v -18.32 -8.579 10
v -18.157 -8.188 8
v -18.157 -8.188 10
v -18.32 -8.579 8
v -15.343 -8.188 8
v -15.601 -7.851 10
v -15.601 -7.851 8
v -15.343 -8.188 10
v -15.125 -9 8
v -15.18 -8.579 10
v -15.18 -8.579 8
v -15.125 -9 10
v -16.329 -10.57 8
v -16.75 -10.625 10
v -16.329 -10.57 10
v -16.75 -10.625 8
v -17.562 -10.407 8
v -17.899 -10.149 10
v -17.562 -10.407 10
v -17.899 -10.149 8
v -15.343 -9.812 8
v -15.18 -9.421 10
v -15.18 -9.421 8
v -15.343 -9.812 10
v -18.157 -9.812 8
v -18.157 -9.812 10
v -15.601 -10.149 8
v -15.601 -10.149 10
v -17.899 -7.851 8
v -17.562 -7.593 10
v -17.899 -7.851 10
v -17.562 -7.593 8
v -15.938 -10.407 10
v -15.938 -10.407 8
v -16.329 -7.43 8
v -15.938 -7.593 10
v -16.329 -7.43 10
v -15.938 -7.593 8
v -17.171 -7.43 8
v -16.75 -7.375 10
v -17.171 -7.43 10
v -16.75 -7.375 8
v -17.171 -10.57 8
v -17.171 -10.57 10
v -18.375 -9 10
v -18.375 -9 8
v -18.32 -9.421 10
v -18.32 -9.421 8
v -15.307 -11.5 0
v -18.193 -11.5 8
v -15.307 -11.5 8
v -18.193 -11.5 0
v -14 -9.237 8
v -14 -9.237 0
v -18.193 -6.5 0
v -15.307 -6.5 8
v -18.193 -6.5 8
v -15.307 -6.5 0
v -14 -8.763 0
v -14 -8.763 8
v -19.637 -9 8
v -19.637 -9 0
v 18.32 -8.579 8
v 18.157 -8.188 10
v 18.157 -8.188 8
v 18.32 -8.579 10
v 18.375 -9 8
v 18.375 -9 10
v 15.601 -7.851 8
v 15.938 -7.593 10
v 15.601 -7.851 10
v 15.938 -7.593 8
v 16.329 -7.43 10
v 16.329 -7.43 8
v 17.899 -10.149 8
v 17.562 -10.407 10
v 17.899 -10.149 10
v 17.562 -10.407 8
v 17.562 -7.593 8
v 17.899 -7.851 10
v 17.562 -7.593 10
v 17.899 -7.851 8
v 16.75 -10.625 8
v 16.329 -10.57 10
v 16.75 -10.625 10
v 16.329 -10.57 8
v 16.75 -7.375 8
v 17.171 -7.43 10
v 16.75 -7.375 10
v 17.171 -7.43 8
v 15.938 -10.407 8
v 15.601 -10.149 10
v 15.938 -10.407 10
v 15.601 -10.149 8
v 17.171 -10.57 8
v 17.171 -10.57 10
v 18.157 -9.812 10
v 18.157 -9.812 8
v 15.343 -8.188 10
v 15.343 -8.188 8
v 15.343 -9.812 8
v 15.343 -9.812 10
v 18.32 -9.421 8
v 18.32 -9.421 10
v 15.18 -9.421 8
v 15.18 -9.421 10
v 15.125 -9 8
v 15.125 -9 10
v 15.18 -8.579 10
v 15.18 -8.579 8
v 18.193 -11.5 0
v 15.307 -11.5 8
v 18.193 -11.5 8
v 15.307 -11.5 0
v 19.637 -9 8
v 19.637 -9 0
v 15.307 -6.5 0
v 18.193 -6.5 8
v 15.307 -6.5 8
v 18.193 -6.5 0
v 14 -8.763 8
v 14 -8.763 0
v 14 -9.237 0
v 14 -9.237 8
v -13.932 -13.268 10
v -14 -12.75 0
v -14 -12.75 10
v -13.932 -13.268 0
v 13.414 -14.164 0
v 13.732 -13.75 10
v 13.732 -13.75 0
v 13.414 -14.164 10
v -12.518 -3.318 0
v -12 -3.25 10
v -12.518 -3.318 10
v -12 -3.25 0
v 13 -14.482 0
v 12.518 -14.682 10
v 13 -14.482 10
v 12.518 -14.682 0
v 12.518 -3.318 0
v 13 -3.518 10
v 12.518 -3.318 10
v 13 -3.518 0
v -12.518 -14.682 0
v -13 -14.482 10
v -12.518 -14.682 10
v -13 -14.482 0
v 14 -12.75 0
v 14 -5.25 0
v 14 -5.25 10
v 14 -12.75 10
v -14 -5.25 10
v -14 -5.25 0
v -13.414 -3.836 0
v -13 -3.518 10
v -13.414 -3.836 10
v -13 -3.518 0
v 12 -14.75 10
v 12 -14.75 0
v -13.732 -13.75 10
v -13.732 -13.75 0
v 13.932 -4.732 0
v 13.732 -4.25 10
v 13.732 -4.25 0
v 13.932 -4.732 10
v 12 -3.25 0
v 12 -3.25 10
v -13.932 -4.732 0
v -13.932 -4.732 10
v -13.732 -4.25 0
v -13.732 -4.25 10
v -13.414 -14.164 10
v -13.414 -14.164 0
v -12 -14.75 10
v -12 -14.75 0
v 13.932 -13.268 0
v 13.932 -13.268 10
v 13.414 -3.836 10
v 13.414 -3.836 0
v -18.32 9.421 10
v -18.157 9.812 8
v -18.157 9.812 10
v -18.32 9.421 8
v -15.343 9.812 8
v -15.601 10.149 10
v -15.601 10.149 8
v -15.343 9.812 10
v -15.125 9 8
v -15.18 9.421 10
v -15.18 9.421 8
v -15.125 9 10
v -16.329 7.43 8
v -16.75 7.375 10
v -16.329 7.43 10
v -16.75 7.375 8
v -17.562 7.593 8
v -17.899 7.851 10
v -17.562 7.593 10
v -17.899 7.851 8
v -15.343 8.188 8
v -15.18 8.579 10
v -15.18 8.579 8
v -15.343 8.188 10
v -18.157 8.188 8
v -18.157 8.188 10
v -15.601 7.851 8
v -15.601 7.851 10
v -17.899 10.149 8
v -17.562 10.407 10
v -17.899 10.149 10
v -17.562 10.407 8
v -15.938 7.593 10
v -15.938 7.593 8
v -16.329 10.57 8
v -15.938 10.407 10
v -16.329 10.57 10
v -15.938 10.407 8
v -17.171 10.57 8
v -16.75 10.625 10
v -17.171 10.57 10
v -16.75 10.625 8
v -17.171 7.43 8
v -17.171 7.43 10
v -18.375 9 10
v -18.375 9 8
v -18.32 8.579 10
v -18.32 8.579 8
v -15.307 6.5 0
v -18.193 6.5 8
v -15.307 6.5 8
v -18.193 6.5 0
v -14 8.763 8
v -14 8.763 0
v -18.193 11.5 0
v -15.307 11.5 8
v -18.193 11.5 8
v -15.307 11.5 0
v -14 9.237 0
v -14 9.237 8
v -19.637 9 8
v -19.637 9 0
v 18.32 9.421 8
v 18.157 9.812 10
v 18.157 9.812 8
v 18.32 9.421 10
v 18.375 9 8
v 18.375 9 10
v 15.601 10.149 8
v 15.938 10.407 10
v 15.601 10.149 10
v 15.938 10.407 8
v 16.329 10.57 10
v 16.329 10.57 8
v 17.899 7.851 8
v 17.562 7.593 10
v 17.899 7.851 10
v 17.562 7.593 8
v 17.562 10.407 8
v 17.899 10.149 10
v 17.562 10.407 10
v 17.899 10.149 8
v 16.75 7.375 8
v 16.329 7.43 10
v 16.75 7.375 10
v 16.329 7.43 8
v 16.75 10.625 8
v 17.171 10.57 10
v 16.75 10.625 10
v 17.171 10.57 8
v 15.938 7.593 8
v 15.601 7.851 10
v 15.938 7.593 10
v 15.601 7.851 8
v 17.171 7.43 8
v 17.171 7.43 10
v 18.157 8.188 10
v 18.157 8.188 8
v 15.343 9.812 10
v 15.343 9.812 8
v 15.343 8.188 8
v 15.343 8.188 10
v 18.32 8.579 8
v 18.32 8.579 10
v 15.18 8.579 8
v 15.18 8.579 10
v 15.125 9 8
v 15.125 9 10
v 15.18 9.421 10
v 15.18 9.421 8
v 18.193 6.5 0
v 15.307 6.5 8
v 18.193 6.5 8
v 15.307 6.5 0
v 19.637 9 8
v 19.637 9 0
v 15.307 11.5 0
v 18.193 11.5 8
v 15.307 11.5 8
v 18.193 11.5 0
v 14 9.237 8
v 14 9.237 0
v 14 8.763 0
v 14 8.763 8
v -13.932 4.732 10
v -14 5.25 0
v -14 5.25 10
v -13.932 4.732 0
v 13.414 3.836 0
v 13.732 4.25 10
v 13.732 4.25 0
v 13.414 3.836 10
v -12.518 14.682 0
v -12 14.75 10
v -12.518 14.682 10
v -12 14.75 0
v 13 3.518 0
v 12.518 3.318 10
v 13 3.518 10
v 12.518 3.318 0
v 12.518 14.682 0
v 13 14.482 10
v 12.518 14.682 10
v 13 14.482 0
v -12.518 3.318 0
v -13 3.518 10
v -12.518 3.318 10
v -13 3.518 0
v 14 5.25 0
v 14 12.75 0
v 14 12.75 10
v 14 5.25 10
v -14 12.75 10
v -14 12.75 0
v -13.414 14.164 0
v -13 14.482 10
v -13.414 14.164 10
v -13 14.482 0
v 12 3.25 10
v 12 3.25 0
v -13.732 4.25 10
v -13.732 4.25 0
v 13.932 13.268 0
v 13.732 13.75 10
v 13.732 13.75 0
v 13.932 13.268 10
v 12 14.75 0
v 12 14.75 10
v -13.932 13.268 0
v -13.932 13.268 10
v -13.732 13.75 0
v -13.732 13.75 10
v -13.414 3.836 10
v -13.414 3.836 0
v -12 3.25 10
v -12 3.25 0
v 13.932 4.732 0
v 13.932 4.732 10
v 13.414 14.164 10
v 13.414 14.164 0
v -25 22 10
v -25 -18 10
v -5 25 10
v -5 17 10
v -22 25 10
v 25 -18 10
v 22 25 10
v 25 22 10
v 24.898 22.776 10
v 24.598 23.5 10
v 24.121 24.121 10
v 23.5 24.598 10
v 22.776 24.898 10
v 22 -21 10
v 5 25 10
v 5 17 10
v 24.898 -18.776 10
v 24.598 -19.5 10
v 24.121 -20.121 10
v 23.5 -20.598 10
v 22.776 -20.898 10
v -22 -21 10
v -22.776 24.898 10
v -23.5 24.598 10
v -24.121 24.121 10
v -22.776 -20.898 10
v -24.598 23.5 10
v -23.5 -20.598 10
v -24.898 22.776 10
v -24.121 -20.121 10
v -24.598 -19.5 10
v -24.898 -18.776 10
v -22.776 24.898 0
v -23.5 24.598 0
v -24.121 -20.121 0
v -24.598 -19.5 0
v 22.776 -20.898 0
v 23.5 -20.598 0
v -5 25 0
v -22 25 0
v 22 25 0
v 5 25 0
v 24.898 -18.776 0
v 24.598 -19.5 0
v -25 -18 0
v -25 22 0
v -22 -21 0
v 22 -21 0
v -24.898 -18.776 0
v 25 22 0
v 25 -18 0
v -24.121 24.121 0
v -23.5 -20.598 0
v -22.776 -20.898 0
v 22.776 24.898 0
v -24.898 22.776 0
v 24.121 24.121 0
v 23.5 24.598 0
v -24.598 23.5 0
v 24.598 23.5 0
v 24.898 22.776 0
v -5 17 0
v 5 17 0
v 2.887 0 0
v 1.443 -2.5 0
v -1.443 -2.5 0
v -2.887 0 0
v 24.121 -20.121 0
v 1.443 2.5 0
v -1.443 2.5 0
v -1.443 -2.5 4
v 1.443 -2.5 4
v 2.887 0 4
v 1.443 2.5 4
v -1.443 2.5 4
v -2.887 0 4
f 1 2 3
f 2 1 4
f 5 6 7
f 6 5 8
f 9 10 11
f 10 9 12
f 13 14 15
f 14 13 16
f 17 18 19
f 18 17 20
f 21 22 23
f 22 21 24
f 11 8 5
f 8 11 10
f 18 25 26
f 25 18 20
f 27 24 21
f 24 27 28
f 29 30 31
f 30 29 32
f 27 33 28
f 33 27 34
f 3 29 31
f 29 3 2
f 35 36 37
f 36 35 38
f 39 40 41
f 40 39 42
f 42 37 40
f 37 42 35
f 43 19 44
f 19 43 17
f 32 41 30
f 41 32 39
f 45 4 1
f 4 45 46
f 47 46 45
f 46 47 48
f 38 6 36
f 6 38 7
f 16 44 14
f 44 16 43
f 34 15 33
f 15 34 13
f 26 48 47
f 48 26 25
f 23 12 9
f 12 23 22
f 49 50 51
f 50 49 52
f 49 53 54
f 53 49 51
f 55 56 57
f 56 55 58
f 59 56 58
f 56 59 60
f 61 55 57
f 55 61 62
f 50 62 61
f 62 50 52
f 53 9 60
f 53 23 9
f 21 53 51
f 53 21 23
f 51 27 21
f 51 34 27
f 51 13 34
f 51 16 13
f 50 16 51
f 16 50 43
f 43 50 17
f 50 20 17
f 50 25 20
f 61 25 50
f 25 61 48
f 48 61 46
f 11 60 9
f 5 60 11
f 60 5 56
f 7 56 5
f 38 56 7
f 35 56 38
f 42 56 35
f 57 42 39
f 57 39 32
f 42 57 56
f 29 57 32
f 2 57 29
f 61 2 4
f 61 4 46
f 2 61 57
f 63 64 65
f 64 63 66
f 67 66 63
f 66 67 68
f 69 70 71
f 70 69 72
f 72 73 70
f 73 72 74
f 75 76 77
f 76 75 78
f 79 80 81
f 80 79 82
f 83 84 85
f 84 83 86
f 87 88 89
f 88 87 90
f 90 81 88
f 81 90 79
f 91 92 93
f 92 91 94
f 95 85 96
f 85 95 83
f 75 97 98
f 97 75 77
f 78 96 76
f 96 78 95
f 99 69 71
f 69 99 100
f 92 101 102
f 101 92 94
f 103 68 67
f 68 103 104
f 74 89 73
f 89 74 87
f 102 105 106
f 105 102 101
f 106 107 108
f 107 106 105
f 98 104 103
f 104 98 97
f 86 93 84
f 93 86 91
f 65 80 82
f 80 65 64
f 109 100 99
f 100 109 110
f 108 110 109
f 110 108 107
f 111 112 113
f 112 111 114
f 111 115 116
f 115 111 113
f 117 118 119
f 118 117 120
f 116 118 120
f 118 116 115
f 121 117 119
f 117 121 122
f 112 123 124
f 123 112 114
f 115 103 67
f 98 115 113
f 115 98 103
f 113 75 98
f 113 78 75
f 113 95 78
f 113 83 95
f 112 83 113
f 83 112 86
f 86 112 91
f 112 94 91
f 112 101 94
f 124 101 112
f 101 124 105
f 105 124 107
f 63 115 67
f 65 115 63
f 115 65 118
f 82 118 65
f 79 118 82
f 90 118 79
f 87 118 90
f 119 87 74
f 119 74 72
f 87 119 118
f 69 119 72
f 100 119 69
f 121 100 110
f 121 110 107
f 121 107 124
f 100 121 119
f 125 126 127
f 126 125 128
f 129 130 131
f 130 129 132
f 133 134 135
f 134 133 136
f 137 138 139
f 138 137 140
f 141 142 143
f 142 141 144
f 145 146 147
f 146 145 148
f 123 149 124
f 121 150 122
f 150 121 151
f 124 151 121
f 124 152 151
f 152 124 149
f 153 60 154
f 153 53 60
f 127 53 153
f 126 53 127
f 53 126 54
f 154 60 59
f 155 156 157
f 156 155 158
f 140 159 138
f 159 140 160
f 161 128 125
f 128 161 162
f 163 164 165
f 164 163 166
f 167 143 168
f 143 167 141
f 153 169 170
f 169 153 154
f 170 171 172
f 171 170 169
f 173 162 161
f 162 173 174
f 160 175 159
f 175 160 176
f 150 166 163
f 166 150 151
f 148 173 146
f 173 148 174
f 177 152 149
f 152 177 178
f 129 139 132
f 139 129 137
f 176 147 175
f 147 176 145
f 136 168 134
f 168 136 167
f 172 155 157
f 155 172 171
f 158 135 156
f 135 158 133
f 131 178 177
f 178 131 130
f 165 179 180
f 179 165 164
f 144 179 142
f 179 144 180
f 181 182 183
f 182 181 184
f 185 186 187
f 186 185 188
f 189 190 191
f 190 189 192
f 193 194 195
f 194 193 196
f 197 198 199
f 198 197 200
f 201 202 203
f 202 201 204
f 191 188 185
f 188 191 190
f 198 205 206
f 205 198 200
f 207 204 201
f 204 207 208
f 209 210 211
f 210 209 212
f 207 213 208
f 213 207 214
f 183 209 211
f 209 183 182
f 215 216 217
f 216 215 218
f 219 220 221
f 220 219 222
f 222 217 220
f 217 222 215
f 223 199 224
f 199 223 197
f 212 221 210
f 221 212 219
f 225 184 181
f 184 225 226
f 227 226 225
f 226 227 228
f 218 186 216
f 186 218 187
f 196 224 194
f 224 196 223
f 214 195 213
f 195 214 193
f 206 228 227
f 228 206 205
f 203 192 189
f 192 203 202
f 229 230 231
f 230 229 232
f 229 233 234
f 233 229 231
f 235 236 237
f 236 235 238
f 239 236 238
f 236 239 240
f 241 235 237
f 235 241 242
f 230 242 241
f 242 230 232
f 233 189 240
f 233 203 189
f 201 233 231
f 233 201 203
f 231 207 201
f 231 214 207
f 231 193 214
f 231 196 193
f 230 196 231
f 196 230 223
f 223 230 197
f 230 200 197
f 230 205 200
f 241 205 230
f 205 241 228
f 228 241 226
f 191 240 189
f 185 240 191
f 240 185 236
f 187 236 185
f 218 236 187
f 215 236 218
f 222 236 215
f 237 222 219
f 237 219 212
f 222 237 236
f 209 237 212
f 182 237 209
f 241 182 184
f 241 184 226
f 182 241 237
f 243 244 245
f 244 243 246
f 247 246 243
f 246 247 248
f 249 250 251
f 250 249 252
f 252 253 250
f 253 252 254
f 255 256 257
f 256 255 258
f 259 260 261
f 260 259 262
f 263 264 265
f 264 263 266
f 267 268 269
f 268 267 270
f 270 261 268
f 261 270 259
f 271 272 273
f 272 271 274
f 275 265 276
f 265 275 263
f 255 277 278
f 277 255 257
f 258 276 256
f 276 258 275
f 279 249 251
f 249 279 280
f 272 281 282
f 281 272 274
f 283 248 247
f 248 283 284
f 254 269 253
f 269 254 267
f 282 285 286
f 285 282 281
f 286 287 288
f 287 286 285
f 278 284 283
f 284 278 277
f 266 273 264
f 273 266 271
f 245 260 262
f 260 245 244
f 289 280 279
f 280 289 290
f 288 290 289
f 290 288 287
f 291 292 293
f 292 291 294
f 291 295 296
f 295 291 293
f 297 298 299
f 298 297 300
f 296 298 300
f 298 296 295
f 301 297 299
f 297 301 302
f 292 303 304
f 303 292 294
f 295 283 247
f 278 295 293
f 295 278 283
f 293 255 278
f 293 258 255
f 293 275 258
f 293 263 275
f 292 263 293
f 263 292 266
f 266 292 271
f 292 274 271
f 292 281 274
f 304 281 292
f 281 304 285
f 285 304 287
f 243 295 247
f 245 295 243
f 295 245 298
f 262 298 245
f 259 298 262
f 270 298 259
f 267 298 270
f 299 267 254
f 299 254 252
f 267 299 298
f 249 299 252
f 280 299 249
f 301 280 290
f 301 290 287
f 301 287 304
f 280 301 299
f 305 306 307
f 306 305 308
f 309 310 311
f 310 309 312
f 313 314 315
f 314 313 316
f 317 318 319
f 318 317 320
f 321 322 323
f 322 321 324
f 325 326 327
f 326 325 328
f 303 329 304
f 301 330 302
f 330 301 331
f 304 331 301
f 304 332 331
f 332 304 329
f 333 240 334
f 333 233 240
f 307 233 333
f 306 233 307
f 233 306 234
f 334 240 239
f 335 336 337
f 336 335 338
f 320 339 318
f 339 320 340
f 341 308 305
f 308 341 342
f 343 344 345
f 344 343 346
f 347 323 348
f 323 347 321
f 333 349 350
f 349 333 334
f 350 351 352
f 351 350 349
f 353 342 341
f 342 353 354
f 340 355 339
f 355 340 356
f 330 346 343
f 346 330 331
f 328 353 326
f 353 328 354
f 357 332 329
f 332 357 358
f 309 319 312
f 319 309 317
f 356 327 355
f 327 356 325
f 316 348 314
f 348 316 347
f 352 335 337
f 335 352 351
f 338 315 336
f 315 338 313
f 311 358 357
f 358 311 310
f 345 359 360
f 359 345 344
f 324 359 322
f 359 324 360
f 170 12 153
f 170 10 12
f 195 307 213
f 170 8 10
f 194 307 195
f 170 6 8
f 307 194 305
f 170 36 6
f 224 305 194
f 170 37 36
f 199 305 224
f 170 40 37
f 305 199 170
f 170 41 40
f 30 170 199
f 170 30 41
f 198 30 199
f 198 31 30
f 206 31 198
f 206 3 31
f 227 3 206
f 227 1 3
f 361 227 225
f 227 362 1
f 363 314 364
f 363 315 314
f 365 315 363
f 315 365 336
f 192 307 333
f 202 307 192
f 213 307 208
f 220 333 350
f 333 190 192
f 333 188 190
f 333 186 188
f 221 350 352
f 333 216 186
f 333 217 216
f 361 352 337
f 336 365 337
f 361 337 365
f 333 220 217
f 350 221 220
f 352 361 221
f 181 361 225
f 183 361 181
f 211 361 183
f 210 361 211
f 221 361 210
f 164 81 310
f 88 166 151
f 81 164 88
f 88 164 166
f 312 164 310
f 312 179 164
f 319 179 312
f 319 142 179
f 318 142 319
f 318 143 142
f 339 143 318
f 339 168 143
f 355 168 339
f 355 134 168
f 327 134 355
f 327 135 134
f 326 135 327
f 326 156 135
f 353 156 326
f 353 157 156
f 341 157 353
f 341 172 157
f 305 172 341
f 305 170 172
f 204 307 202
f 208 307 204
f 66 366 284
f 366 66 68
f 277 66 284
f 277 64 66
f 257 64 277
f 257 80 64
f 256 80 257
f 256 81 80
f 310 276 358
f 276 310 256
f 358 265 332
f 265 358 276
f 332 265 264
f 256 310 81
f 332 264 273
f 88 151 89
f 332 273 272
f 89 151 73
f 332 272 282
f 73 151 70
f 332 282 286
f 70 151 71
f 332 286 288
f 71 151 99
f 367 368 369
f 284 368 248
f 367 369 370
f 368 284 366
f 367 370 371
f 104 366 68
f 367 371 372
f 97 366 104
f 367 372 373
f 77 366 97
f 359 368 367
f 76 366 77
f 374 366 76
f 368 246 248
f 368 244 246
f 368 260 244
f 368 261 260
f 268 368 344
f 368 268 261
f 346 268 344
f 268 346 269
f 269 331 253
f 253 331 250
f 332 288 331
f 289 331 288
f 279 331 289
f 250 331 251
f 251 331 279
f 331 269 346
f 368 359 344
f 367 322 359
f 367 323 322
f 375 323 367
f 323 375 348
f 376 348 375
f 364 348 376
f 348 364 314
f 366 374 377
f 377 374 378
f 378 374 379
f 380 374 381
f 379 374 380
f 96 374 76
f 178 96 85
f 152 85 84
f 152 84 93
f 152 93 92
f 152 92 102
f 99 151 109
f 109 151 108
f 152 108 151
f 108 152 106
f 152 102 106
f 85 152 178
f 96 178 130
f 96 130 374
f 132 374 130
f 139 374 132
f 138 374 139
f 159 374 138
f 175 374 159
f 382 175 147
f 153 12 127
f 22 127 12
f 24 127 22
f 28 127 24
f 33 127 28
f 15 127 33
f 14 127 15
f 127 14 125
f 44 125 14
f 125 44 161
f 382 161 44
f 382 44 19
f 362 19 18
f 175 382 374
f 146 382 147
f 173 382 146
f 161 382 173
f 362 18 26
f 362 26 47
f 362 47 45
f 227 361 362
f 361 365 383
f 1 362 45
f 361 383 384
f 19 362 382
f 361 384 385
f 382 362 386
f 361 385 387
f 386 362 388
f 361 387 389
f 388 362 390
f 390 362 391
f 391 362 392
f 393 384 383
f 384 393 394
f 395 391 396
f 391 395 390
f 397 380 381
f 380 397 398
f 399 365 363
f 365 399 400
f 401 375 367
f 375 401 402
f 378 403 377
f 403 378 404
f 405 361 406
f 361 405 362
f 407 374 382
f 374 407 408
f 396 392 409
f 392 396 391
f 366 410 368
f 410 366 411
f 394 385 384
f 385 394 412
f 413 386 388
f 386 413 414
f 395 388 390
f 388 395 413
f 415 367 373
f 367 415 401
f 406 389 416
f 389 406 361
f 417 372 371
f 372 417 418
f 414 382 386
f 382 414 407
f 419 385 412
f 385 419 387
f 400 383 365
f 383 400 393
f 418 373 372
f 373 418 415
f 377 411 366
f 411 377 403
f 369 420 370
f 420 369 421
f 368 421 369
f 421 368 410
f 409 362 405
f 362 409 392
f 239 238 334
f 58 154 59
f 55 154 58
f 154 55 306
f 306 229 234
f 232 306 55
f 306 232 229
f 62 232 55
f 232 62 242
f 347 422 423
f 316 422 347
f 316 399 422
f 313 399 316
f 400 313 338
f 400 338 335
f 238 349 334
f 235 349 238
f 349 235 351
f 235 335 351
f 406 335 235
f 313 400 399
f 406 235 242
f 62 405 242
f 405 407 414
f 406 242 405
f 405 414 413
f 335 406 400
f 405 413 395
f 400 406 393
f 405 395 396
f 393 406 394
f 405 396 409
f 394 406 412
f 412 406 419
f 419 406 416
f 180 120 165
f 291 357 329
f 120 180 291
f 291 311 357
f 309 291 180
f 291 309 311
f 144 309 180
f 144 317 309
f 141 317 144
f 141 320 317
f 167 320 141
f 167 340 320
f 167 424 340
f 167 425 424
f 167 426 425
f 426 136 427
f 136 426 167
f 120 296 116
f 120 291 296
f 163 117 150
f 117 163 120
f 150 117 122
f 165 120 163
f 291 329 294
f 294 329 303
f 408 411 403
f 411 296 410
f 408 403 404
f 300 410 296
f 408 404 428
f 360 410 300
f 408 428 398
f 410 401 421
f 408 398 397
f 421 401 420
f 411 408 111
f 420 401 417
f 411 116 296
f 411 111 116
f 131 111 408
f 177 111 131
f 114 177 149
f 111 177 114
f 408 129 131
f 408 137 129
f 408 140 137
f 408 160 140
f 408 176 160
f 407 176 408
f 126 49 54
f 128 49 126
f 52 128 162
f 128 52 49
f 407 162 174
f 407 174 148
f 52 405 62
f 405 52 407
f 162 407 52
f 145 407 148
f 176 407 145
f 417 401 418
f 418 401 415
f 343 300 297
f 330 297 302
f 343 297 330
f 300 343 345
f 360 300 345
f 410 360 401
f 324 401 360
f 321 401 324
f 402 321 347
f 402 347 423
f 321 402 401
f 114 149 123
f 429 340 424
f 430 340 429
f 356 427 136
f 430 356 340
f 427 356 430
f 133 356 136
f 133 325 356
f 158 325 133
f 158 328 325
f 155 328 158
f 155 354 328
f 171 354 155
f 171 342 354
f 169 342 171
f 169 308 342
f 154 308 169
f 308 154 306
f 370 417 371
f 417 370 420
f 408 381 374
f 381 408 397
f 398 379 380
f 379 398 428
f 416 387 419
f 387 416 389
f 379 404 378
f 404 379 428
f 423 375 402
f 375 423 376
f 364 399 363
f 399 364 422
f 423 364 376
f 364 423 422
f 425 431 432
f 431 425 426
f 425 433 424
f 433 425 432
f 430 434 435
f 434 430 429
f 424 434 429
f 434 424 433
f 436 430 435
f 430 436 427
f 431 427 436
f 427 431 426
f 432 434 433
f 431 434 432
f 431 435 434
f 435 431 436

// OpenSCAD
// file: ../OpenSCAD_Modules/cube_vround.scad
module cube_vround(
	size=[10,10,10],
	round_corners=[true,true,true,true],
	rounding=3,
	center_xy=false,
	center_z=false,
	attach=0,
	wall_attach=0,
	quality=2, //integer from 1 to infinity
)
{
	assert(len(size)==3);
	assert(len(round_corners)==4);
	assert(rounding>0);
	assert(rounding<=size[0]/2);
	assert(rounding<=size[1]/2);
	assert(quality>0);
	assert(attach>=0);
	assert(wall_attach>=0);
	height=size[2]+attach;
	cyl_r=rounding+wall_attach;
	cyl_mvx=size[0]/2-rounding;
	cyl_mvy=size[1]/2-rounding;
	cube_szx=size[0]/2;
	cube_szy=size[1]/2;
	cube_mvx=cube_szx/2+wall_attach;
	cube_mvy=cube_szy/2+wall_attach;
	translate([center_xy?0:cube_szx,center_xy?0:cube_szy,center_z?-attach/2:(size[2]-attach)/2])
		hull()
		{
			if(round_corners[0])
				translate([cyl_mvx,cyl_mvy])
					cylinder(r=cyl_r,h=height,$fn=12*quality,center=true);
			else
				translate([cube_mvx,cube_mvy])
					cube([cube_szx,cube_szy,height],center=true);
			if(round_corners[1])
				translate([cyl_mvx,-cyl_mvy])
					cylinder(r=cyl_r,h=height,$fn=12*quality,center=true);
			else
				translate([cube_mvx,-cube_mvy])
					cube([cube_szx,cube_szy,height],center=true);
			if(round_corners[2])
				translate([-cyl_mvx,-cyl_mvy])
					cylinder(r=cyl_r,h=height,$fn=12*quality,center=true);
			else
				translate([-cube_mvx,-cube_mvy])
					cube([cube_szx,cube_szy,height],center=true);
			if(round_corners[3])
				translate([-cyl_mvx,cyl_mvy])
					cylinder(r=cyl_r,h=height,$fn=12*quality,center=true);
			else
				translate([-cube_mvx,cube_mvy])
					cube([cube_szx,cube_szy,height],center=true);
		};
}

//example
cube_vround(round_corners=[true,false,true,false],
size=[10,20,6],
attach=0.1,
wall_attach=0.1,
rounding=3,
center_xy=true,center_z=false);
// main file
use <../OpenSCAD_Modules/cube_vround.scad>

module Nut
(
width=5,
height=4,
)
{
	fudge = 1/cos(180/6);
	cylinder(h=height,d=width*fudge,$fn=6);
}

module DB15Cut
(
	extra_width=2,
	width=3.2,
	screw_diam=3.25,
	conn_width=28,
	conn_length=11.5,
	screw_diff=33.5,
	nut_clip_depth=2,
	nut_width=5,
	quality=1,
)
{
	cutClr=0.1;
	union()
	{
		translate([0,0,-width-cutClr])
			cube_vround(size=[conn_width,conn_length,width+extra_width+2*cutClr],rounding=2,center_xy=true,quality=quality);
		translate([-screw_diff/2,0,-width-cutClr])
		{
			cylinder(d=screw_diam,h=width+extra_width+2*cutClr,$fn=quality*12);
			Nut(height=width+extra_width+cutClr-nut_clip_depth,width+nut_width);
		}
		translate([screw_diff/2,0,-width-cutClr])
		{
			cylinder(d=screw_diam,h=width+extra_width+2*cutClr,$fn=quality*12);
			Nut(height=width+extra_width+cutClr-nut_clip_depth,width+nut_width);
		}
	}
}

module DualDB15Holder
(
	size=[50,46,10],
	diff=18,
	shift=2,
	bed_conn_shift=8,
	bed_conn_width=10,
	quality=2,
)
{
	cutClr=0.1;
	difference()
	{
		translate([0,shift,0])
		cube_vround(size=size,center_xy=true,quality=quality);

		for(i=[-1,1])
		translate([0,i*diff/2,0])
		DB15Cut(extra_width=size[2],width=0,quality=quality);

		//color([0.2,0.2,0.2])
		translate([-bed_conn_width/2,diff/2+bed_conn_shift,-cutClr])
		cube(size=[bed_conn_width,size[1],size[2]+2*cutClr]);
		Nut();
	}
}

DualDB15Holder();
